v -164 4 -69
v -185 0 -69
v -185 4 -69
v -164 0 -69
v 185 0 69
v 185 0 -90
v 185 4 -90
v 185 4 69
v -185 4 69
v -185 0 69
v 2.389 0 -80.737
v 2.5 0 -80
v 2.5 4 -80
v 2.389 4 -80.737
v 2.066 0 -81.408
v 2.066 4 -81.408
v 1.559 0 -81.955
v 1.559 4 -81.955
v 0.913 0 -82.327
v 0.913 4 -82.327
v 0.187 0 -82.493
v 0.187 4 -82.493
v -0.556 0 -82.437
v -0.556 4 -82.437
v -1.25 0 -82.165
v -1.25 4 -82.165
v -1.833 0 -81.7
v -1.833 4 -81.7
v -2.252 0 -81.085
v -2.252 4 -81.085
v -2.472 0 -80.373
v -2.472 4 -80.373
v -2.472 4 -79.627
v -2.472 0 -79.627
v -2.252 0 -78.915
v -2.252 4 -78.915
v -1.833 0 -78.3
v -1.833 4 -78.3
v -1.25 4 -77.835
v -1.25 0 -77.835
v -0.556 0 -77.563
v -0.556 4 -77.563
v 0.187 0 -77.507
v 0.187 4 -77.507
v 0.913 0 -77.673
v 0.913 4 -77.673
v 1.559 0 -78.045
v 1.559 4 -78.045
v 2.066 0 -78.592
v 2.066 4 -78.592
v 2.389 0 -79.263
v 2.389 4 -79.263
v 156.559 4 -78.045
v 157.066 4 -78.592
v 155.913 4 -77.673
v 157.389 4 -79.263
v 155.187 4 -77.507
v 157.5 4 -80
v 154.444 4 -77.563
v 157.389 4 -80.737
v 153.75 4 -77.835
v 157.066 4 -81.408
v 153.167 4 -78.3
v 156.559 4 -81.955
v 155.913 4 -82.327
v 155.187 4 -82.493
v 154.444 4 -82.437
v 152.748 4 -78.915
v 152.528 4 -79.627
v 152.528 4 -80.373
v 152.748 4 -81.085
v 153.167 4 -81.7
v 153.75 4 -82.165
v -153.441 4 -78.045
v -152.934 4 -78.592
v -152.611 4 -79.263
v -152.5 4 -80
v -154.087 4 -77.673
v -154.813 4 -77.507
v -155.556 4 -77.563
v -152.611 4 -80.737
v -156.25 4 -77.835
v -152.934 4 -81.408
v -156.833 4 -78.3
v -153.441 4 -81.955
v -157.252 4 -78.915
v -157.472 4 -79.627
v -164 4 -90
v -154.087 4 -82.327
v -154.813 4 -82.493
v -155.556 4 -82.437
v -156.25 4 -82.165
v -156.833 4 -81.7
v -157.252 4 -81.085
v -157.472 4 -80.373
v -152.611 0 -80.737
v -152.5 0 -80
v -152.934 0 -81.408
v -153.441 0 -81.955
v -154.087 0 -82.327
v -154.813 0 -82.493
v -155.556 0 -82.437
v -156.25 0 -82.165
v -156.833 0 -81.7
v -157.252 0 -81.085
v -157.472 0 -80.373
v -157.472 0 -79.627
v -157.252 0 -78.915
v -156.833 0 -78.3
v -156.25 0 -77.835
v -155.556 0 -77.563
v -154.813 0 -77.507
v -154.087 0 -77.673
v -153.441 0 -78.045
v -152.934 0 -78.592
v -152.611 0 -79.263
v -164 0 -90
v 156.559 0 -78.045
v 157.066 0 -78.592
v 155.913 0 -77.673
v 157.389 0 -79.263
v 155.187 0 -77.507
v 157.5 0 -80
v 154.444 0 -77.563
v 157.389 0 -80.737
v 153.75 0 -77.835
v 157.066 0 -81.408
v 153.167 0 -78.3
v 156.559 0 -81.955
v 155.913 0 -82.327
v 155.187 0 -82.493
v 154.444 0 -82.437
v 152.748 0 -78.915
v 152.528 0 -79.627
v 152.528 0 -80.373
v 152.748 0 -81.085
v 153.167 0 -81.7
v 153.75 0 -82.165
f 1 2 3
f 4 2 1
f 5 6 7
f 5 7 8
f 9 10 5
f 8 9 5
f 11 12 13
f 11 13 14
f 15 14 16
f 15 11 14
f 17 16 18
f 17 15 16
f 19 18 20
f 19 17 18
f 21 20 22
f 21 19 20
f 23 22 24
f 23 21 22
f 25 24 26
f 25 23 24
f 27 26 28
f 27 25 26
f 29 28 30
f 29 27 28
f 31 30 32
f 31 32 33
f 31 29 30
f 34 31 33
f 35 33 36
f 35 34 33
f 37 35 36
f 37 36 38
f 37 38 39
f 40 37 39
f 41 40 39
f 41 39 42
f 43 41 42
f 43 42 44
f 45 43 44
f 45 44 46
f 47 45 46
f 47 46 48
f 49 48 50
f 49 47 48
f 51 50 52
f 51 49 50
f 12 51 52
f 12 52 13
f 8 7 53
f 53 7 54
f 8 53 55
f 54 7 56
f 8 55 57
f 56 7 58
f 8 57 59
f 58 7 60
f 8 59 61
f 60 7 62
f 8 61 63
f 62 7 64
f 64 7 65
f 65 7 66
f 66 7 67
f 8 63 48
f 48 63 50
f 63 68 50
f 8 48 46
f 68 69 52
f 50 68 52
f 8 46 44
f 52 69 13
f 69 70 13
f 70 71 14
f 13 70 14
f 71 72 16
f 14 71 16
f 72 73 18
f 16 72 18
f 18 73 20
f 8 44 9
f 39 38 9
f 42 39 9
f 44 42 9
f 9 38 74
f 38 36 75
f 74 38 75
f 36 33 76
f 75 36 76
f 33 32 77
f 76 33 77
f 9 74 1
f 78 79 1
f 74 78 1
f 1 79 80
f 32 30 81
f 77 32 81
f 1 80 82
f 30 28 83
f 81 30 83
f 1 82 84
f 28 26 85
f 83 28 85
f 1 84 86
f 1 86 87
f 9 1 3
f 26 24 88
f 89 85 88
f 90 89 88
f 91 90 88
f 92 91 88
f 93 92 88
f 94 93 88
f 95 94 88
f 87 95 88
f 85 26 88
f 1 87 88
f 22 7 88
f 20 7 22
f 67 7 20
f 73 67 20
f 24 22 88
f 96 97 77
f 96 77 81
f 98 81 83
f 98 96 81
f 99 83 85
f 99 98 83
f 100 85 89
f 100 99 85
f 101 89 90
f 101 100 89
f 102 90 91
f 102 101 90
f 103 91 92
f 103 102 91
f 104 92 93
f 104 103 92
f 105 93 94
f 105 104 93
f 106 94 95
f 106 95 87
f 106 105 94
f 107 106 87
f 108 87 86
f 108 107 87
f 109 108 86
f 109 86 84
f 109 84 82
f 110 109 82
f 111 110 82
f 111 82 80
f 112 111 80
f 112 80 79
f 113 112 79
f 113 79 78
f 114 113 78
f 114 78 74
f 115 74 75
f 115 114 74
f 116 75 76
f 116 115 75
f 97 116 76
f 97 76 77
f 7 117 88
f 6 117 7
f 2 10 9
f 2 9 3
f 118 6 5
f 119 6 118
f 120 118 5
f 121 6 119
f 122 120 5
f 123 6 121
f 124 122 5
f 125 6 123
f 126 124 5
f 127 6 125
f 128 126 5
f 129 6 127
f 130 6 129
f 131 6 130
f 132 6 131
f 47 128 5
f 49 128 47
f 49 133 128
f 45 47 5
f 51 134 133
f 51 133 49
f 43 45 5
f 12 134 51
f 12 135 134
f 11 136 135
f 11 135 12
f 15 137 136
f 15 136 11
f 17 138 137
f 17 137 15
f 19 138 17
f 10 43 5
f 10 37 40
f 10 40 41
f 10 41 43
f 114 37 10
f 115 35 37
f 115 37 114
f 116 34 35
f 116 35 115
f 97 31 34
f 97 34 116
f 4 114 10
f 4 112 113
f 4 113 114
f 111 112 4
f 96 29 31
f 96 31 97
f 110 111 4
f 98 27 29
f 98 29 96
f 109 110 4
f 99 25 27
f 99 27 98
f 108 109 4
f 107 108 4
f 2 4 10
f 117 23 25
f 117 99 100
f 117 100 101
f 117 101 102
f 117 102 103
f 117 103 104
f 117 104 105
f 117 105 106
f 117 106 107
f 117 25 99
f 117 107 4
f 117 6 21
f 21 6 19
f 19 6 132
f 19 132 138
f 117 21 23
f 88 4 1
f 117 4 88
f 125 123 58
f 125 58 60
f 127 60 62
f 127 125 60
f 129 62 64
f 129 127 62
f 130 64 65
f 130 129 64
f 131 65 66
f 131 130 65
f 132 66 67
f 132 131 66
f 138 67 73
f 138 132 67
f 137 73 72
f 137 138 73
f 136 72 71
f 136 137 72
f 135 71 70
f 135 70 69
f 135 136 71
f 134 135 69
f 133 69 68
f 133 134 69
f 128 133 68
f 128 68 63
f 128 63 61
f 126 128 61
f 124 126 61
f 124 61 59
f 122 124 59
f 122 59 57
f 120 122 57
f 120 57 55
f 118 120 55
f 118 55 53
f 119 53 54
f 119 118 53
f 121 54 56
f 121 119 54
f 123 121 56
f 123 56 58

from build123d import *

# Parameters (mm, degrees)
SKETCH1_R           = 2.5
BOSS_EXTRUDE1_DEPTH = 4


with BuildPart() as part:
    # Sketch1 → Boss-Extrude1 (new body)
    with BuildSketch(Plane(origin=(0, 0, 0), x_dir=(1, 0, 0), z_dir=(0, 1, 0))):
        Polygon((-185, -69), (-185, 69), (-164, 69), (-164, 90), (185, 90), (185, -69), (-164, -69), align=None)
        with Locations((-155, 80)):
            Circle(SKETCH1_R, mode=Mode.SUBTRACT)
        with Locations((0, 80)):
            Circle(SKETCH1_R, mode=Mode.SUBTRACT)
        with Locations((155, 80)):
            Circle(SKETCH1_R, mode=Mode.SUBTRACT)
    extrude(amount=BOSS_EXTRUDE1_DEPTH)


solid = part.part
